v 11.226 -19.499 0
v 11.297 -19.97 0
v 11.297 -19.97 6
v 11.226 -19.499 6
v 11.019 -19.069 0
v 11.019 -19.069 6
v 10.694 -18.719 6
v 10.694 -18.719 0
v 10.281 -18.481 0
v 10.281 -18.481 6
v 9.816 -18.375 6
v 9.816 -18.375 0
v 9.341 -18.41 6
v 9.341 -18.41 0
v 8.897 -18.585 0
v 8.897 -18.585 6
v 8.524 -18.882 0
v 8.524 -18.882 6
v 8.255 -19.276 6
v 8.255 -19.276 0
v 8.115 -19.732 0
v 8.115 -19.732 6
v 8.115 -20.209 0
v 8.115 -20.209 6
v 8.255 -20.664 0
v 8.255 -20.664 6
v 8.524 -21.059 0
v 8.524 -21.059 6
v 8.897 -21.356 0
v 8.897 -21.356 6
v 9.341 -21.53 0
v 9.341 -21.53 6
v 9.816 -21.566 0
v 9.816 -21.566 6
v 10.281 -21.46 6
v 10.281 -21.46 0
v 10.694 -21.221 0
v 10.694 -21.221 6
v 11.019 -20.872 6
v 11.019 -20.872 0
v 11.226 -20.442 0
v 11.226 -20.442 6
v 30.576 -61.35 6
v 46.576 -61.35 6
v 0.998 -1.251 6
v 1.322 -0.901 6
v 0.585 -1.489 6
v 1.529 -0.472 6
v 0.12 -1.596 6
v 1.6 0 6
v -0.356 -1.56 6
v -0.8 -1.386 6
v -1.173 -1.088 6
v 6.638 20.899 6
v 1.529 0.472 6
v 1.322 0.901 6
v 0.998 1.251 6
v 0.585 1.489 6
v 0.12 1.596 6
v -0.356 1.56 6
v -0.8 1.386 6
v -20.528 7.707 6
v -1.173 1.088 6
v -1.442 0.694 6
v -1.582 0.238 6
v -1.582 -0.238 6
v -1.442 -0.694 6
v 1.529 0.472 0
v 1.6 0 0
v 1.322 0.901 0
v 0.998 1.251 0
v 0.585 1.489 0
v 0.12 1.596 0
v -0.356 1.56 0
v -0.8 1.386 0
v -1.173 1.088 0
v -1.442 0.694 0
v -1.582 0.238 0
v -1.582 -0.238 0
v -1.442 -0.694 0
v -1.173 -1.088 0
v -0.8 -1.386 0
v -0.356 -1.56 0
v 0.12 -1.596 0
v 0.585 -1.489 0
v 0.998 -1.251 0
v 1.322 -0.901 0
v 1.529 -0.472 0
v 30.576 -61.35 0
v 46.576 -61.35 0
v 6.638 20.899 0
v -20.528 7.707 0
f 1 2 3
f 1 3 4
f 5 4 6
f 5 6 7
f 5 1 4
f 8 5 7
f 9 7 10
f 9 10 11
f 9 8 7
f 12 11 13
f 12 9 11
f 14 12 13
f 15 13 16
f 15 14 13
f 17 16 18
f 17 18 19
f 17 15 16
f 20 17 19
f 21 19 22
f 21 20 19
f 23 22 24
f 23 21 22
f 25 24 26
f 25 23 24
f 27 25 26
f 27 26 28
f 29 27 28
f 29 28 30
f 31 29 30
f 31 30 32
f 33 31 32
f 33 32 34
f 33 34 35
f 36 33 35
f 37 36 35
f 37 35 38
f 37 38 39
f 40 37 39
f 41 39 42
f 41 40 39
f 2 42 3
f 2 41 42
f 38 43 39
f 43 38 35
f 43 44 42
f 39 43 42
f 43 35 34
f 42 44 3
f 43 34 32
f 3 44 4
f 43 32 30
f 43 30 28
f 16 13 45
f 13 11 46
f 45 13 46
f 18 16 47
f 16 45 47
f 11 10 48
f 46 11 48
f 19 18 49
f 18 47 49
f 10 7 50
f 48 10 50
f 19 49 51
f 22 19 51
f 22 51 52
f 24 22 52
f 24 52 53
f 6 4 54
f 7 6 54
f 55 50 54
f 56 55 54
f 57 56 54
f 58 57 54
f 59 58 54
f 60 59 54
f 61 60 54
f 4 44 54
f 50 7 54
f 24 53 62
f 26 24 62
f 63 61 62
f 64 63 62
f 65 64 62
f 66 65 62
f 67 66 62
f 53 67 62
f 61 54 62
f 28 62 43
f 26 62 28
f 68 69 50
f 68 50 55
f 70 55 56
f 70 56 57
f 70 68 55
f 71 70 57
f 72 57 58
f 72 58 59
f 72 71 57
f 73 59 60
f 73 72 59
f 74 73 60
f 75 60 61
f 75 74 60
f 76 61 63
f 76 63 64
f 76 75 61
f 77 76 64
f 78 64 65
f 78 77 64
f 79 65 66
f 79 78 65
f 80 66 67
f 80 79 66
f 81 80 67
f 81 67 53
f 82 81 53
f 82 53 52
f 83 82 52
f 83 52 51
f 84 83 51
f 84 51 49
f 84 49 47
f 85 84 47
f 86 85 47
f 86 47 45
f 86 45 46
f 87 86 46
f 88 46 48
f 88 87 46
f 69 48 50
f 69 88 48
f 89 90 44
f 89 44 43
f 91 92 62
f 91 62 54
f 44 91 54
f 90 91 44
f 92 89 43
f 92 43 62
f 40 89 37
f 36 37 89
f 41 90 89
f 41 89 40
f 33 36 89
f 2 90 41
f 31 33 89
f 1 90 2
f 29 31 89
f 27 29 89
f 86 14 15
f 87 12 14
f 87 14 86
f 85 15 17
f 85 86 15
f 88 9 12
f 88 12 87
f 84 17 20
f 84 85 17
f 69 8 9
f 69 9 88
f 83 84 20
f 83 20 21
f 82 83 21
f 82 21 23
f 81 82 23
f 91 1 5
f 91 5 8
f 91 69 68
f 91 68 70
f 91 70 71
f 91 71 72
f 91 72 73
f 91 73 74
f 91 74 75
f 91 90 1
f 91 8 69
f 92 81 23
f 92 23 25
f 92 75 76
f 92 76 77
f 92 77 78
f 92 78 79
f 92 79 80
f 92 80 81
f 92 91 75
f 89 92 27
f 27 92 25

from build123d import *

# Parameters (mm, degrees)
SKETCH1_R           = 1.6
BOSS_EXTRUDE1_DEPTH = 6


with BuildPart() as part:
    # Sketch1 → Boss-Extrude1 (new body)
    with BuildSketch(Plane.XY):
        Polygon((-20.528429637, 7.707371577), (6.638285905, 20.898640153), (46.575535608, -61.35), (30.575535608, -61.35), align=None)
        Circle(SKETCH1_R, mode=Mode.SUBTRACT)
        with Locations((9.696892794, -19.970234604)):
            Circle(SKETCH1_R, mode=Mode.SUBTRACT)
    extrude(amount=BOSS_EXTRUDE1_DEPTH)


solid = part.part
